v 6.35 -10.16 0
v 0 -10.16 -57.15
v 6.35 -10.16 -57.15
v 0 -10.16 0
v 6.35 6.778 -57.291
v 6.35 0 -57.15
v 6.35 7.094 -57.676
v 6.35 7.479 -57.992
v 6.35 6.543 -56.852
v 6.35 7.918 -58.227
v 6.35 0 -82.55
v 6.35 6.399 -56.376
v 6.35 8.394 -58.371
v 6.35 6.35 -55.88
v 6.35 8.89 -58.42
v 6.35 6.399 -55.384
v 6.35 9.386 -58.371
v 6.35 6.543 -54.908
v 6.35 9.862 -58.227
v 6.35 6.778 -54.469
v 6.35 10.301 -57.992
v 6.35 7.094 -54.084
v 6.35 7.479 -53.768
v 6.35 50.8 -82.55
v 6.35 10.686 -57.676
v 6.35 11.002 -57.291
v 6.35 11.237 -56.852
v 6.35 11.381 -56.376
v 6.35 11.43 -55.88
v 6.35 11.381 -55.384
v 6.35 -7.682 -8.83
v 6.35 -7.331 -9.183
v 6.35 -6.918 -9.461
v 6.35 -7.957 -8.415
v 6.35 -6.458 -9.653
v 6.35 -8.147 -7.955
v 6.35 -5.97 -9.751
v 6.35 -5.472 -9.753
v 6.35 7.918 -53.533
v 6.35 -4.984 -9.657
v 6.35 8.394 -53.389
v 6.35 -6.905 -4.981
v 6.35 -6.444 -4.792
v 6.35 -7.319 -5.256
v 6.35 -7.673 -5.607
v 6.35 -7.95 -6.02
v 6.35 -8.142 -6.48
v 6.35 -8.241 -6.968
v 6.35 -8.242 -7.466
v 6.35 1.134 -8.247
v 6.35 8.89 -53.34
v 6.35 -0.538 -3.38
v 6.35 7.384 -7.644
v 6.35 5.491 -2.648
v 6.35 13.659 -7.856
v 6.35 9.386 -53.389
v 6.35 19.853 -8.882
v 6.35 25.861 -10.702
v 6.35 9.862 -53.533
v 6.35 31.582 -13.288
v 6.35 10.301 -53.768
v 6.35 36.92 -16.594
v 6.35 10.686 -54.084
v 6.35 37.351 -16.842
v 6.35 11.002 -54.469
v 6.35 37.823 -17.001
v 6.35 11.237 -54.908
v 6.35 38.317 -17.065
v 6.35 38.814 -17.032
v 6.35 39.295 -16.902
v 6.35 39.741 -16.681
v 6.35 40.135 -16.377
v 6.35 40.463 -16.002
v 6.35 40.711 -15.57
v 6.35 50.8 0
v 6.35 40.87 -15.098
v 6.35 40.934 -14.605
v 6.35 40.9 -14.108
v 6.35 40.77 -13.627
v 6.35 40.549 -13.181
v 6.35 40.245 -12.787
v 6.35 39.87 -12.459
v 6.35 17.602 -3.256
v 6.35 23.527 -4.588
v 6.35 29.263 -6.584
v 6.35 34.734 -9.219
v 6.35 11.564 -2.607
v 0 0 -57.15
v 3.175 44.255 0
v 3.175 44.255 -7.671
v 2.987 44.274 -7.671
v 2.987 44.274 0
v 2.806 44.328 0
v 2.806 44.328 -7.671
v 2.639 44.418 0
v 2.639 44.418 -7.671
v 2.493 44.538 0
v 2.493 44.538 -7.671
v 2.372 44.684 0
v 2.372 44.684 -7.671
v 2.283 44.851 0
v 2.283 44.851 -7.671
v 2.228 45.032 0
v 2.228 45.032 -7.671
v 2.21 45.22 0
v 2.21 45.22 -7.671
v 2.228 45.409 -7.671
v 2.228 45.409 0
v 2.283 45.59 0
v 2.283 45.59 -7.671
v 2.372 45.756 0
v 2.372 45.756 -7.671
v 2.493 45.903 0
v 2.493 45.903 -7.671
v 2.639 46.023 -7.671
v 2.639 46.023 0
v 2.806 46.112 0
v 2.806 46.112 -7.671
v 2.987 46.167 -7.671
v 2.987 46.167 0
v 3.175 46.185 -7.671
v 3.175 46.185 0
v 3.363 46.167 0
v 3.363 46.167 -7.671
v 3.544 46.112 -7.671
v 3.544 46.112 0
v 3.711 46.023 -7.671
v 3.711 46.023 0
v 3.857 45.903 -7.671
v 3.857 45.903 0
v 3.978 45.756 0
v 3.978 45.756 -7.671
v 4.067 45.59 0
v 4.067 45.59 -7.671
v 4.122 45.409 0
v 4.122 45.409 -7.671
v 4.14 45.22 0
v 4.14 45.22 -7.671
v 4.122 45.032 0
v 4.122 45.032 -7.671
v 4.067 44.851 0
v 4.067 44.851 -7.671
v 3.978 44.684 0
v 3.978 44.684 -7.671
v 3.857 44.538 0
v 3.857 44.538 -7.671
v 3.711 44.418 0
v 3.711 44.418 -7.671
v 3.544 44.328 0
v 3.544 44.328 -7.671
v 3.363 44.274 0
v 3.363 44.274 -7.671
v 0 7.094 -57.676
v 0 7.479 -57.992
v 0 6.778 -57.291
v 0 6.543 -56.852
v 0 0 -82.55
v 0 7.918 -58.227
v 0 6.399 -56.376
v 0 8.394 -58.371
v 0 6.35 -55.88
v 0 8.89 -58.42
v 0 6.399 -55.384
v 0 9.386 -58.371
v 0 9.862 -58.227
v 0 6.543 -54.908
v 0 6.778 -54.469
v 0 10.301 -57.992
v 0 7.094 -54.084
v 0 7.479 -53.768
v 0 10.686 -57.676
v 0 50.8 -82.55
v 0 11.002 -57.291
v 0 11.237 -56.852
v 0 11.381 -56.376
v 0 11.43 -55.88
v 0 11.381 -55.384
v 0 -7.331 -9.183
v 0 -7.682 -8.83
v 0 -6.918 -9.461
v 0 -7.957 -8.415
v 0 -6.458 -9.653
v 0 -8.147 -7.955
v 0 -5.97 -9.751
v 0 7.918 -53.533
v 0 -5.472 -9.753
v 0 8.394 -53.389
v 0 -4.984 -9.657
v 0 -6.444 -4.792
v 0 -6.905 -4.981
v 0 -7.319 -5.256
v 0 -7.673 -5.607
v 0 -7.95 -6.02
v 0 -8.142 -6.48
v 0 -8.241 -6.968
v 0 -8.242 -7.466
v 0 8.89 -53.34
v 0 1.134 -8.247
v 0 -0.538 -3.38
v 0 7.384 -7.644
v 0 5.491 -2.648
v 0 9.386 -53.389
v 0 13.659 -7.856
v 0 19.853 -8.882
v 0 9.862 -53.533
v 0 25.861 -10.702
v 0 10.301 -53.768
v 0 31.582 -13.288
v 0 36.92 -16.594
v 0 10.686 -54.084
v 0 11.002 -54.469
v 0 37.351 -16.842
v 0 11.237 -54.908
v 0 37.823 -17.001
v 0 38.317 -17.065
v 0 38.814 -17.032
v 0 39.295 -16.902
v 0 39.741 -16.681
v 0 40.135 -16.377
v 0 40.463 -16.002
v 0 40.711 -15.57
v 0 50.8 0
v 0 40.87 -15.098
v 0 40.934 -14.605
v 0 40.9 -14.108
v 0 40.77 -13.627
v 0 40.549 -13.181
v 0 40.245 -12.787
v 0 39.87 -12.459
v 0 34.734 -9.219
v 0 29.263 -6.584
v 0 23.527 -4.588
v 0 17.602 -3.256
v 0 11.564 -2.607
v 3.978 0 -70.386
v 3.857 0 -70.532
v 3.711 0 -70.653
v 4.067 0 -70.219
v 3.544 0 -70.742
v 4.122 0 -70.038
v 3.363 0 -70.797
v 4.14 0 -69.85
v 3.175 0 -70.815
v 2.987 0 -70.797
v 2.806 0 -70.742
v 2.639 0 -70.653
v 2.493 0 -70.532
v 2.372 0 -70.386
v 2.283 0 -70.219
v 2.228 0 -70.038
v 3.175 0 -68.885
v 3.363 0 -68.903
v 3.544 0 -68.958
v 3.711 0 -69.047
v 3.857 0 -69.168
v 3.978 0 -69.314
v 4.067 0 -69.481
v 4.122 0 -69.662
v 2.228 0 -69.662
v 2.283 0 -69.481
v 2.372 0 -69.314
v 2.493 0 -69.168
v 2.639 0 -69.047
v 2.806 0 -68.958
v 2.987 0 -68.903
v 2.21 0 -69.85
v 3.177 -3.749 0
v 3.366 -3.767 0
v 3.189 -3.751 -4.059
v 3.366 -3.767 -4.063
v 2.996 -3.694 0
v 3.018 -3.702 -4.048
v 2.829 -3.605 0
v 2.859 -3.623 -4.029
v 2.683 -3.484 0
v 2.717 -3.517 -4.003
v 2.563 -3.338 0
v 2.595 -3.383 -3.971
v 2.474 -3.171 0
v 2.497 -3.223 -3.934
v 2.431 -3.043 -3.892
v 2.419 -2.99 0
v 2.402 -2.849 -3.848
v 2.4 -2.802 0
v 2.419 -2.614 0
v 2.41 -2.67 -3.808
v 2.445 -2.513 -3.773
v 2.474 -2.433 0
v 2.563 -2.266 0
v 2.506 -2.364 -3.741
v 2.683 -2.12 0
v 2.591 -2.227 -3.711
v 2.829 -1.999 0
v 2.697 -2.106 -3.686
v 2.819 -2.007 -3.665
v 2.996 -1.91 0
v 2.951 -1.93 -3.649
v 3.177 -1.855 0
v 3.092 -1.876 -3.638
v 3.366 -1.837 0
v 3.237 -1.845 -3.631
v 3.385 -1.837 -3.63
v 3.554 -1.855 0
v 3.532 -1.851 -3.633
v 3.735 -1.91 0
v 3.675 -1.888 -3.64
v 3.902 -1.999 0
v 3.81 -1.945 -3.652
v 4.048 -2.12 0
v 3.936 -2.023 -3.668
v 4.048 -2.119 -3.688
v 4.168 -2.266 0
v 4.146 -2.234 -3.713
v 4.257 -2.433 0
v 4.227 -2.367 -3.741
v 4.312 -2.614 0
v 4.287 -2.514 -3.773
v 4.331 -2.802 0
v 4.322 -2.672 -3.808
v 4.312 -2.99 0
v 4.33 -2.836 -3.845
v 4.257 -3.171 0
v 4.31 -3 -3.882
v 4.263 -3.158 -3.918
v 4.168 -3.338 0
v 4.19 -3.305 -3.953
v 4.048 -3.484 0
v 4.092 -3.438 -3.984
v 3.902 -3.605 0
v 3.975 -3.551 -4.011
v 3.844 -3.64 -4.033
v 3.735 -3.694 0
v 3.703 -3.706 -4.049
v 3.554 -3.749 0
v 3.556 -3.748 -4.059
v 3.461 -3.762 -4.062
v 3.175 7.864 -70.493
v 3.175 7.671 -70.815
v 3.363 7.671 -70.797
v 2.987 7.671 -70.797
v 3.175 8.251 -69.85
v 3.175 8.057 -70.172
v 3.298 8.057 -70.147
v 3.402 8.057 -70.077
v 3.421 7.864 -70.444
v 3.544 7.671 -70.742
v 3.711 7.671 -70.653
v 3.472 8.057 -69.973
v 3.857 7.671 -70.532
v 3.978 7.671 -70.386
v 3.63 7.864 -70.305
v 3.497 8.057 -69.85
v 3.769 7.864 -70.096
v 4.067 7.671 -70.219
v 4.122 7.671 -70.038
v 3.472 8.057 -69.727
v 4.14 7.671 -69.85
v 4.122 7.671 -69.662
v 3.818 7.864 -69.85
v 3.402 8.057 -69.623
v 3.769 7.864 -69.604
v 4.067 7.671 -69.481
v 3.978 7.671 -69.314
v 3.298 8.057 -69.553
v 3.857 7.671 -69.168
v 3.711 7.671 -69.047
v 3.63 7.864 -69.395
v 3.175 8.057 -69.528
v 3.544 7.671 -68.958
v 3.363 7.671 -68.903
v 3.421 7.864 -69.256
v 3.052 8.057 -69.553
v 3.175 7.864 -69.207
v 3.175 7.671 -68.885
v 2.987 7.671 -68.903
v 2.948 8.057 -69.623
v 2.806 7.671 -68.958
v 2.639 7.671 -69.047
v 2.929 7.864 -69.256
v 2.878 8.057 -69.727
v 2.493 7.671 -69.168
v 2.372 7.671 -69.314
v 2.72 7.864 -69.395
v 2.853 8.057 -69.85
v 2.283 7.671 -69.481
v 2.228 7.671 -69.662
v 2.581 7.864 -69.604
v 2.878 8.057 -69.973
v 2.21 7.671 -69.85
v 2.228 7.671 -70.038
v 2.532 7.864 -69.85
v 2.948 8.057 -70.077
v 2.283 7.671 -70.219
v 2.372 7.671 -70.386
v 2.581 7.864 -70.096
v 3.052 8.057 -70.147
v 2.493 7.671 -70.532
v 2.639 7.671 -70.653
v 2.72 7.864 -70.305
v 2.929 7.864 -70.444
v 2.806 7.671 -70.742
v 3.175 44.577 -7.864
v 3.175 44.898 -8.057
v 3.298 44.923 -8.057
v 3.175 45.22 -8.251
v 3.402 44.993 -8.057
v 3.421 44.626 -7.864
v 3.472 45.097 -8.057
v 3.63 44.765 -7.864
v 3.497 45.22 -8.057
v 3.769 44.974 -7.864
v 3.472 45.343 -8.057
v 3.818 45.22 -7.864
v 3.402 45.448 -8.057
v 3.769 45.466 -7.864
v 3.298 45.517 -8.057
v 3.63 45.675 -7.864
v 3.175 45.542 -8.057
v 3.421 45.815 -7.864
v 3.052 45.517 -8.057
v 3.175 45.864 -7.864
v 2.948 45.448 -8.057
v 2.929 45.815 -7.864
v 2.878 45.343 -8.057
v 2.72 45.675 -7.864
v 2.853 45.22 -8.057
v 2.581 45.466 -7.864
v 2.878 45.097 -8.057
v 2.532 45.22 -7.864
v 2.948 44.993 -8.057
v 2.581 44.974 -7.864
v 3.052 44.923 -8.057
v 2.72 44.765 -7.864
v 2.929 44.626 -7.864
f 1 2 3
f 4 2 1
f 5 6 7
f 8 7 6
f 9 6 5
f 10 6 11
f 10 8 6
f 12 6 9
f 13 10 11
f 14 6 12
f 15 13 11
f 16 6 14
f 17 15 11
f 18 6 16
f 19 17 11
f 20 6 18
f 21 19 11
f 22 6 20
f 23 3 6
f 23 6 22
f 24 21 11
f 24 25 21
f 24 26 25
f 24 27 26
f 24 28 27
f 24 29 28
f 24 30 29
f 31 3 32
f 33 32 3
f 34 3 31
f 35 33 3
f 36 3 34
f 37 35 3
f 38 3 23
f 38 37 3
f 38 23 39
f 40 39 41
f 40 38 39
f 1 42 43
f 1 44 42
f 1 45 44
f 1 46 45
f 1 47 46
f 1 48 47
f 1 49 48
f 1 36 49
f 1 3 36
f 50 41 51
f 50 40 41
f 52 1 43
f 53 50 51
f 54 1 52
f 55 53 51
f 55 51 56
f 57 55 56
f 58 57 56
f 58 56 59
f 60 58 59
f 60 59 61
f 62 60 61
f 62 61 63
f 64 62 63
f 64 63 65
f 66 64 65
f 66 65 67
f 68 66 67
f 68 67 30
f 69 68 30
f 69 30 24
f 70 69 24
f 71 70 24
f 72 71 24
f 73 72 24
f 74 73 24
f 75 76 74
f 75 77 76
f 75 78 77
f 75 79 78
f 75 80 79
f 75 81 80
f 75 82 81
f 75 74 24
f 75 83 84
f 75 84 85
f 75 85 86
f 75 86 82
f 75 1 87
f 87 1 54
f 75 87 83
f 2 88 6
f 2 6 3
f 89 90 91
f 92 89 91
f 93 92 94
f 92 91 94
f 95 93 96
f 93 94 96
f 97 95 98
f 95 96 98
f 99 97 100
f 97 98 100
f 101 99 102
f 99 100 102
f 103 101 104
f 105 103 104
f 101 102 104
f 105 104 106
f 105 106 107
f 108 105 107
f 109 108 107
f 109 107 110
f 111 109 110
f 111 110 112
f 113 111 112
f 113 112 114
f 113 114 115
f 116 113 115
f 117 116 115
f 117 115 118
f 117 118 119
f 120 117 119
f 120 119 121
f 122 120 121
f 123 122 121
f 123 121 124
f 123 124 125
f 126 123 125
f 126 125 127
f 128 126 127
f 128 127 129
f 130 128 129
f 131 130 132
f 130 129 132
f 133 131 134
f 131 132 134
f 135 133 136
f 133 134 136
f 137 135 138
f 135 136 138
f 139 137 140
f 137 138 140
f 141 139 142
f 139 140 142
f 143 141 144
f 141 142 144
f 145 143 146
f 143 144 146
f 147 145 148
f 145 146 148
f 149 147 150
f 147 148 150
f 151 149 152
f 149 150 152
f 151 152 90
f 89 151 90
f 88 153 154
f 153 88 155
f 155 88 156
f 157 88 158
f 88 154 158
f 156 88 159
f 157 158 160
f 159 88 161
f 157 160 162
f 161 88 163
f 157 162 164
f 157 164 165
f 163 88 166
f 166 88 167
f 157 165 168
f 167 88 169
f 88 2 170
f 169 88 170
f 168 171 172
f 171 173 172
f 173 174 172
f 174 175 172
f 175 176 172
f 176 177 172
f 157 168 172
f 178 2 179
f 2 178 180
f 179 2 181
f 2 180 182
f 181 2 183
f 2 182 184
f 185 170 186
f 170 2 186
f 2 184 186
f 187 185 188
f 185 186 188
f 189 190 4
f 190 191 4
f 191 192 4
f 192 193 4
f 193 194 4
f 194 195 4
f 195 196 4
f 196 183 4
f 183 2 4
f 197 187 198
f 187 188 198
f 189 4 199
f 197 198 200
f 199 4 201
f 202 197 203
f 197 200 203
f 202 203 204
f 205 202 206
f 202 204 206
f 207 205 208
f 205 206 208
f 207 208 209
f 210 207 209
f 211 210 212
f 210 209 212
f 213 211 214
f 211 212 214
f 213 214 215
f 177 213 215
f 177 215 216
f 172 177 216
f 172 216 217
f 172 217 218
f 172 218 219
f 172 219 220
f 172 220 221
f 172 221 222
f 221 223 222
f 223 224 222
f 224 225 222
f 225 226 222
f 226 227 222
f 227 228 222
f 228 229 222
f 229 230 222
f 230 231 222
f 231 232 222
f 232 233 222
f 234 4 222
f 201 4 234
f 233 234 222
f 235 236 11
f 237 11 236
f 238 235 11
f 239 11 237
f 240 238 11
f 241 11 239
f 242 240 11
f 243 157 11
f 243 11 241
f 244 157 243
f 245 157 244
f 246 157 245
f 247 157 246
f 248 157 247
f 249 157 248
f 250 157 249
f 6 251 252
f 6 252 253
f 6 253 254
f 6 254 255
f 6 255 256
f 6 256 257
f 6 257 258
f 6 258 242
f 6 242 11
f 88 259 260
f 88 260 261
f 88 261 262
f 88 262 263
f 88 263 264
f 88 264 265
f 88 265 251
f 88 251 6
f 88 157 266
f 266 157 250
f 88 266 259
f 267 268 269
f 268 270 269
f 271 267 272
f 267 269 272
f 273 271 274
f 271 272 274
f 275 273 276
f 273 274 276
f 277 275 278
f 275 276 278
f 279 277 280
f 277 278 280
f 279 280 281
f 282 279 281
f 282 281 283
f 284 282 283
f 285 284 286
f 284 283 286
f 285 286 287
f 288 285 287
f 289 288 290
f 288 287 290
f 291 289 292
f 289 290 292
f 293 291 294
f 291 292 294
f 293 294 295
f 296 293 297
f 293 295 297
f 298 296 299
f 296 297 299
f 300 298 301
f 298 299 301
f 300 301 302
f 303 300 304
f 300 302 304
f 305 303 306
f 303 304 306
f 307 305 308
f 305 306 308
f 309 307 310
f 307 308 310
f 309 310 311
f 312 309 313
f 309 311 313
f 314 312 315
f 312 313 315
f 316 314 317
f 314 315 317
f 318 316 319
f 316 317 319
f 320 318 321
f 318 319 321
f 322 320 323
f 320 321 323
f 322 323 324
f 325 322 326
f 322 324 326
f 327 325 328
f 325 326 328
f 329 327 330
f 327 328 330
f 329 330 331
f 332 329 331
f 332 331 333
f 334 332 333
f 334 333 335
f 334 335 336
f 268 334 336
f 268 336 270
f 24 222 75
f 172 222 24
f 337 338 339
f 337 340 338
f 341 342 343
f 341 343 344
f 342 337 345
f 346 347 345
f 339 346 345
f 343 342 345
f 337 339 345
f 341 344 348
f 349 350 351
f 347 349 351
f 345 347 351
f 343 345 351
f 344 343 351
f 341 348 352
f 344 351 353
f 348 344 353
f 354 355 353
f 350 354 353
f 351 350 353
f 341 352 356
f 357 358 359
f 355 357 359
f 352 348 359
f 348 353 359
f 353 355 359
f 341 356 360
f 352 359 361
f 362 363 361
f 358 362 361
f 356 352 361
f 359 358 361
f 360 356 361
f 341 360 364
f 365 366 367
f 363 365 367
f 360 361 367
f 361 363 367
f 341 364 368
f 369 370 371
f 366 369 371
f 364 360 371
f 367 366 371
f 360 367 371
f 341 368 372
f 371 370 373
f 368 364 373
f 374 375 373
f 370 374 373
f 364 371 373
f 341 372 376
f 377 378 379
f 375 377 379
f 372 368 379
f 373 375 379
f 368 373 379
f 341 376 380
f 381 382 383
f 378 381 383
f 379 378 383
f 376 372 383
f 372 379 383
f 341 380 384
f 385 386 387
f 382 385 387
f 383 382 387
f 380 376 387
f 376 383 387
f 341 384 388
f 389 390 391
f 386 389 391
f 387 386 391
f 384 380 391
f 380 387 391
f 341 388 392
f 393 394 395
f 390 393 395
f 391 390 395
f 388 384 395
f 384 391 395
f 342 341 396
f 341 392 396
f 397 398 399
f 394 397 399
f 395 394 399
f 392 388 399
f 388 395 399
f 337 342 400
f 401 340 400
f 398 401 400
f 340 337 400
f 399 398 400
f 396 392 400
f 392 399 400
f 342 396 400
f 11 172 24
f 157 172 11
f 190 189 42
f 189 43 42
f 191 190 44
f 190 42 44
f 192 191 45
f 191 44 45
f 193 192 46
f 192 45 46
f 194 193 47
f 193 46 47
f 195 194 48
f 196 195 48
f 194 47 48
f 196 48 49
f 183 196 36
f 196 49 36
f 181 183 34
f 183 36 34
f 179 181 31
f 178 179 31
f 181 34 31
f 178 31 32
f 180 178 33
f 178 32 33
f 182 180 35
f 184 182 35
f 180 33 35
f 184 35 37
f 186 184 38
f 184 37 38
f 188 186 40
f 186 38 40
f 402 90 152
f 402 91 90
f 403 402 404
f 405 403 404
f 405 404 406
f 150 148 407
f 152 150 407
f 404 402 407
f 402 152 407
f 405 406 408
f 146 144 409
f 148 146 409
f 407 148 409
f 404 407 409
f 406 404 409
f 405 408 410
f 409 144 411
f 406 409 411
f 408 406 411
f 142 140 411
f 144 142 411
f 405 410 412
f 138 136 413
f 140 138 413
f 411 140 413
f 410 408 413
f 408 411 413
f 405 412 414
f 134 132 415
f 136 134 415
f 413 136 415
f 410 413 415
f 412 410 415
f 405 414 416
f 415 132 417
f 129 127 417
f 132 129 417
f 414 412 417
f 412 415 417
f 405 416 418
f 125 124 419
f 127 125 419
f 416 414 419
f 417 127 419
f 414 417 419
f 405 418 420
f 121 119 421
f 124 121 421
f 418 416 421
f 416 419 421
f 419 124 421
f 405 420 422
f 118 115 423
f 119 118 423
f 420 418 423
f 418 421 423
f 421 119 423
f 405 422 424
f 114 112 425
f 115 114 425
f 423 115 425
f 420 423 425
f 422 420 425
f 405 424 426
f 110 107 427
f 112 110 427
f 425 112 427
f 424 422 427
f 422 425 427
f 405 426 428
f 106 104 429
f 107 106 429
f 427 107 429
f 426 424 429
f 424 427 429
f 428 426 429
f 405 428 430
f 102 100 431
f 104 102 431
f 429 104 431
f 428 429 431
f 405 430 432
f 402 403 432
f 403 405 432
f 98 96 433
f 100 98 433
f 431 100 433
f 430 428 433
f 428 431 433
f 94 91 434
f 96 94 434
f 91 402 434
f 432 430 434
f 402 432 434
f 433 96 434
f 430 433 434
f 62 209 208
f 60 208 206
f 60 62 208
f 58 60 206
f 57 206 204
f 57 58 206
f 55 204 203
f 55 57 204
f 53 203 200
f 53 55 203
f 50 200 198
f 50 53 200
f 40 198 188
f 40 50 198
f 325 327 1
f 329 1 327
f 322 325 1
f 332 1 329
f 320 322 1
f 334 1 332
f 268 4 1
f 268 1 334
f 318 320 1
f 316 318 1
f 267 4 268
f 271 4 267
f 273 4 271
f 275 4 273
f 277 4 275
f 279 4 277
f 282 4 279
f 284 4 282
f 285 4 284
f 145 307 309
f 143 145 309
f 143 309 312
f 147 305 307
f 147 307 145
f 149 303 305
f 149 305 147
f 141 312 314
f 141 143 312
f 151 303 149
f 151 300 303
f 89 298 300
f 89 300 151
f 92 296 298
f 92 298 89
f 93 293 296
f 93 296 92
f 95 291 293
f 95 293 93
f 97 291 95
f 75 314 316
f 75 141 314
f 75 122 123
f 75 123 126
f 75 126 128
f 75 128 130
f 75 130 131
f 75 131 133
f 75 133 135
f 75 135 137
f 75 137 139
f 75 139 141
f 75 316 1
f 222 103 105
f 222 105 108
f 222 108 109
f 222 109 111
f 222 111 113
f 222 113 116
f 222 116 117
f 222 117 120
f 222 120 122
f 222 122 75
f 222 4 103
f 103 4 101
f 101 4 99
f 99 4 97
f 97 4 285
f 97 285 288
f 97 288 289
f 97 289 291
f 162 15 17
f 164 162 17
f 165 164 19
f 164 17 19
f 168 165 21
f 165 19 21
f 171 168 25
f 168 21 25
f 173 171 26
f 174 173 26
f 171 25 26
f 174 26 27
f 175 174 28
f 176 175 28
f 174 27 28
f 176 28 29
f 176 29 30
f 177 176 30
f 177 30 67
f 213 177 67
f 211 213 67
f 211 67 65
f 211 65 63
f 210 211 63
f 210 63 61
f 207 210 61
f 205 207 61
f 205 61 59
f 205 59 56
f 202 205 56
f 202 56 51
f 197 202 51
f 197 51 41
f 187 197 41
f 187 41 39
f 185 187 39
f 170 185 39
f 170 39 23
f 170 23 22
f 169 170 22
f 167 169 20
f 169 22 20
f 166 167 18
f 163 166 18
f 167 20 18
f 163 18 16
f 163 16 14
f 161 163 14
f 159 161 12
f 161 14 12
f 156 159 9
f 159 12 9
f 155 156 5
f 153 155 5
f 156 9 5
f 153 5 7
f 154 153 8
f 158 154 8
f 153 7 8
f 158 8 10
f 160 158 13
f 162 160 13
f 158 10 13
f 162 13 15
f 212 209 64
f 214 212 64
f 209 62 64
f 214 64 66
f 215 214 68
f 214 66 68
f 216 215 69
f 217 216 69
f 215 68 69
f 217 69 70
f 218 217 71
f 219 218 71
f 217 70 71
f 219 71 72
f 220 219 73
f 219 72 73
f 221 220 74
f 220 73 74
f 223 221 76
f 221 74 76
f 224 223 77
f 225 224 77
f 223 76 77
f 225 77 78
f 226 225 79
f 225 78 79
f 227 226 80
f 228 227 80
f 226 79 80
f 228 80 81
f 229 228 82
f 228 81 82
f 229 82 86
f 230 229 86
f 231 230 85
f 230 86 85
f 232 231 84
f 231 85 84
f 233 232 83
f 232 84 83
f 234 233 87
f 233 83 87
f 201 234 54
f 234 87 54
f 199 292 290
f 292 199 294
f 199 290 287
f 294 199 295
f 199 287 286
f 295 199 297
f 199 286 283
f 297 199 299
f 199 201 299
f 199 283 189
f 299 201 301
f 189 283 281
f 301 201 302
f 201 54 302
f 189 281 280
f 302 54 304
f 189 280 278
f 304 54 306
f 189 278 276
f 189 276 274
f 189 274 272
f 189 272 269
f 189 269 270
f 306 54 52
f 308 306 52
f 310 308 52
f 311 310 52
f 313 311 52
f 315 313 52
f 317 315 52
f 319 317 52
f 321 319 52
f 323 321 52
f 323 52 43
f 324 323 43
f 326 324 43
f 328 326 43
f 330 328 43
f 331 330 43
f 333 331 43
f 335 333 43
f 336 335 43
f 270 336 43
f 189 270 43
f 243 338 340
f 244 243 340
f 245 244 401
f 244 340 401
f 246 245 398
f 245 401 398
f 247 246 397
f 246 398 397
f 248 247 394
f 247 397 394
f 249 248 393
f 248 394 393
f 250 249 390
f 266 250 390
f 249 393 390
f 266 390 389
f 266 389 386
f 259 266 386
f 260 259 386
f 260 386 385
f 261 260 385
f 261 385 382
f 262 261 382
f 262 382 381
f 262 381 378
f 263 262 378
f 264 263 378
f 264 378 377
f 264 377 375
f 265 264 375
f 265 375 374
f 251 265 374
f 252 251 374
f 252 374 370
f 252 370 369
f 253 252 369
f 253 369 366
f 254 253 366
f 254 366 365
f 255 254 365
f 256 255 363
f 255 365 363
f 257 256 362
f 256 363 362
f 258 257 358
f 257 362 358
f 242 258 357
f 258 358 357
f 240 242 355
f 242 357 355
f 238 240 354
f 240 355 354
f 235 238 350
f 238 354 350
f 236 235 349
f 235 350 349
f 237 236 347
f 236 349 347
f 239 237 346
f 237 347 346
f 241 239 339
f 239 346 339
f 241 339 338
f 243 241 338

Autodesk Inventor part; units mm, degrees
ref_plane "YZ Plane" through (0, 0, 0) normal (1, 0, 0) x (0, 1, 0)
ref_plane "XZ Plane" through (0, 0, 0) normal (0, 1, 0) x (-1, 0, 0)
ref_plane "XY Plane" through (0, 0, 0) normal (0, 0, 1) x (1, 0, 0)
sketch "Sketch1" plane through (0, 0, 0) normal (1, 0, 0) x (0, 1, 0)
  line L0 (0, 0) -> (50.8, 0)
  line L1 (50.8, 0) -> (50.8, -82.55)
  line L2 (50.8, -82.55) -> (0, -82.55)
  line L3 (0, -82.55) -> (0, -57.15)
  line L4 (0, -57.15) -> (-10.16, -57.15)
  line L5 (-10.16, -57.15) -> (-10.16, 0)
  line L6 (-10.16, 0) -> (0, 0)
  dimension "d0" = 82.55
  dimension "d1" = 50.8
  dimension "d27" = 25.4
  dimension "d28" = 10.16
extrude "Extrusion1" add sketch "Sketch1" along normal blind 6.35
sketch "Sketch2" plane through (6.35, 0, 0) normal (1, 0, 0) x (0, 0, -1)
  circle A0 centre (55.88, 8.89) radius 2.54
  line L0 (0, 0) -> (25.4, 0) projected
  line L1 (0, 50.8) -> (0, 0) projected
  line L2 (57.15, -10.16) -> (57.15, 0) projected
  arc A1 (14.5266, 38.3949) -> (7.2244, -5.7138) centre (55.88, 8.89) ccw construction
  arc A2 (12.459, 39.8702) -> (4.7916, -6.444) centre (55.88, 8.89) ccw
  arc A3 (16.5943, 36.9197) -> (9.6572, -4.9836) centre (55.88, 8.89) ccw
  arc A4 (16.5943, 36.9197) -> (12.459, 39.8702) centre (14.5266, 38.3949) ccw
  arc A5 (4.7916, -6.444) -> (9.6572, -4.9836) centre (7.2244, -5.7138) ccw
  point P0 (82.55, 0)
  dimension "d4" = 8.89
  dimension "d7" = 5.08
  dimension "d43" = 1.27
  dimension "d44" = 52.214
  dimension "d46" = 2.54
  dimension "d47" = 50.8
extrude "Extrusion2" cut sketch "Sketch2" against normal through all
sketch "Sketch6" plane through (0, 0, -82.55) normal (0, -1, 0) x (1, 0, 0)
  line L0 (0, 0) -> (0, 25.4) projected
  line L1 (0, 0) -> (0, 25.4) projected
  line L2 (0, 0) -> (6.35, 0) projected
  line L3 (6.35, 25.4) -> (6.35, 0) projected
  line L4 (0, 25.4) -> (6.35, 25.4) projected
  point P0 (0, 82.55)
  point P1 (3.175, 12.7)
sketch "Sketch7" plane through (0, -10.16, 0) normal (0, 0, 1) x (1, 0, 0)
  line L0 (0, 0) -> (0, 60.96) projected
  line L1 (0, 0) -> (6.35, 0) projected
  line L2 (6.35, 60.96) -> (6.35, 0) projected
  line L3 (0, 60.96) -> (6.35, 60.96) projected
  point P0 (0, 10.16)
  point P1 (3.3657, 7.358)
  point P2 (3.175, 55.3802)
hole "Hole2" at (3.175, 0, -69.85) direction (0, 1, 0) diameter 1.9304 depth 7.6708 tip angle 118
hole "Hole3" at (3.3657, -2.802, 0) at (3.175, 45.2202, 0) direction (0, 0, -1) diameter 1.9304 depth 7.6708 tip angle 118
properties part number "third odomitry wheel"
